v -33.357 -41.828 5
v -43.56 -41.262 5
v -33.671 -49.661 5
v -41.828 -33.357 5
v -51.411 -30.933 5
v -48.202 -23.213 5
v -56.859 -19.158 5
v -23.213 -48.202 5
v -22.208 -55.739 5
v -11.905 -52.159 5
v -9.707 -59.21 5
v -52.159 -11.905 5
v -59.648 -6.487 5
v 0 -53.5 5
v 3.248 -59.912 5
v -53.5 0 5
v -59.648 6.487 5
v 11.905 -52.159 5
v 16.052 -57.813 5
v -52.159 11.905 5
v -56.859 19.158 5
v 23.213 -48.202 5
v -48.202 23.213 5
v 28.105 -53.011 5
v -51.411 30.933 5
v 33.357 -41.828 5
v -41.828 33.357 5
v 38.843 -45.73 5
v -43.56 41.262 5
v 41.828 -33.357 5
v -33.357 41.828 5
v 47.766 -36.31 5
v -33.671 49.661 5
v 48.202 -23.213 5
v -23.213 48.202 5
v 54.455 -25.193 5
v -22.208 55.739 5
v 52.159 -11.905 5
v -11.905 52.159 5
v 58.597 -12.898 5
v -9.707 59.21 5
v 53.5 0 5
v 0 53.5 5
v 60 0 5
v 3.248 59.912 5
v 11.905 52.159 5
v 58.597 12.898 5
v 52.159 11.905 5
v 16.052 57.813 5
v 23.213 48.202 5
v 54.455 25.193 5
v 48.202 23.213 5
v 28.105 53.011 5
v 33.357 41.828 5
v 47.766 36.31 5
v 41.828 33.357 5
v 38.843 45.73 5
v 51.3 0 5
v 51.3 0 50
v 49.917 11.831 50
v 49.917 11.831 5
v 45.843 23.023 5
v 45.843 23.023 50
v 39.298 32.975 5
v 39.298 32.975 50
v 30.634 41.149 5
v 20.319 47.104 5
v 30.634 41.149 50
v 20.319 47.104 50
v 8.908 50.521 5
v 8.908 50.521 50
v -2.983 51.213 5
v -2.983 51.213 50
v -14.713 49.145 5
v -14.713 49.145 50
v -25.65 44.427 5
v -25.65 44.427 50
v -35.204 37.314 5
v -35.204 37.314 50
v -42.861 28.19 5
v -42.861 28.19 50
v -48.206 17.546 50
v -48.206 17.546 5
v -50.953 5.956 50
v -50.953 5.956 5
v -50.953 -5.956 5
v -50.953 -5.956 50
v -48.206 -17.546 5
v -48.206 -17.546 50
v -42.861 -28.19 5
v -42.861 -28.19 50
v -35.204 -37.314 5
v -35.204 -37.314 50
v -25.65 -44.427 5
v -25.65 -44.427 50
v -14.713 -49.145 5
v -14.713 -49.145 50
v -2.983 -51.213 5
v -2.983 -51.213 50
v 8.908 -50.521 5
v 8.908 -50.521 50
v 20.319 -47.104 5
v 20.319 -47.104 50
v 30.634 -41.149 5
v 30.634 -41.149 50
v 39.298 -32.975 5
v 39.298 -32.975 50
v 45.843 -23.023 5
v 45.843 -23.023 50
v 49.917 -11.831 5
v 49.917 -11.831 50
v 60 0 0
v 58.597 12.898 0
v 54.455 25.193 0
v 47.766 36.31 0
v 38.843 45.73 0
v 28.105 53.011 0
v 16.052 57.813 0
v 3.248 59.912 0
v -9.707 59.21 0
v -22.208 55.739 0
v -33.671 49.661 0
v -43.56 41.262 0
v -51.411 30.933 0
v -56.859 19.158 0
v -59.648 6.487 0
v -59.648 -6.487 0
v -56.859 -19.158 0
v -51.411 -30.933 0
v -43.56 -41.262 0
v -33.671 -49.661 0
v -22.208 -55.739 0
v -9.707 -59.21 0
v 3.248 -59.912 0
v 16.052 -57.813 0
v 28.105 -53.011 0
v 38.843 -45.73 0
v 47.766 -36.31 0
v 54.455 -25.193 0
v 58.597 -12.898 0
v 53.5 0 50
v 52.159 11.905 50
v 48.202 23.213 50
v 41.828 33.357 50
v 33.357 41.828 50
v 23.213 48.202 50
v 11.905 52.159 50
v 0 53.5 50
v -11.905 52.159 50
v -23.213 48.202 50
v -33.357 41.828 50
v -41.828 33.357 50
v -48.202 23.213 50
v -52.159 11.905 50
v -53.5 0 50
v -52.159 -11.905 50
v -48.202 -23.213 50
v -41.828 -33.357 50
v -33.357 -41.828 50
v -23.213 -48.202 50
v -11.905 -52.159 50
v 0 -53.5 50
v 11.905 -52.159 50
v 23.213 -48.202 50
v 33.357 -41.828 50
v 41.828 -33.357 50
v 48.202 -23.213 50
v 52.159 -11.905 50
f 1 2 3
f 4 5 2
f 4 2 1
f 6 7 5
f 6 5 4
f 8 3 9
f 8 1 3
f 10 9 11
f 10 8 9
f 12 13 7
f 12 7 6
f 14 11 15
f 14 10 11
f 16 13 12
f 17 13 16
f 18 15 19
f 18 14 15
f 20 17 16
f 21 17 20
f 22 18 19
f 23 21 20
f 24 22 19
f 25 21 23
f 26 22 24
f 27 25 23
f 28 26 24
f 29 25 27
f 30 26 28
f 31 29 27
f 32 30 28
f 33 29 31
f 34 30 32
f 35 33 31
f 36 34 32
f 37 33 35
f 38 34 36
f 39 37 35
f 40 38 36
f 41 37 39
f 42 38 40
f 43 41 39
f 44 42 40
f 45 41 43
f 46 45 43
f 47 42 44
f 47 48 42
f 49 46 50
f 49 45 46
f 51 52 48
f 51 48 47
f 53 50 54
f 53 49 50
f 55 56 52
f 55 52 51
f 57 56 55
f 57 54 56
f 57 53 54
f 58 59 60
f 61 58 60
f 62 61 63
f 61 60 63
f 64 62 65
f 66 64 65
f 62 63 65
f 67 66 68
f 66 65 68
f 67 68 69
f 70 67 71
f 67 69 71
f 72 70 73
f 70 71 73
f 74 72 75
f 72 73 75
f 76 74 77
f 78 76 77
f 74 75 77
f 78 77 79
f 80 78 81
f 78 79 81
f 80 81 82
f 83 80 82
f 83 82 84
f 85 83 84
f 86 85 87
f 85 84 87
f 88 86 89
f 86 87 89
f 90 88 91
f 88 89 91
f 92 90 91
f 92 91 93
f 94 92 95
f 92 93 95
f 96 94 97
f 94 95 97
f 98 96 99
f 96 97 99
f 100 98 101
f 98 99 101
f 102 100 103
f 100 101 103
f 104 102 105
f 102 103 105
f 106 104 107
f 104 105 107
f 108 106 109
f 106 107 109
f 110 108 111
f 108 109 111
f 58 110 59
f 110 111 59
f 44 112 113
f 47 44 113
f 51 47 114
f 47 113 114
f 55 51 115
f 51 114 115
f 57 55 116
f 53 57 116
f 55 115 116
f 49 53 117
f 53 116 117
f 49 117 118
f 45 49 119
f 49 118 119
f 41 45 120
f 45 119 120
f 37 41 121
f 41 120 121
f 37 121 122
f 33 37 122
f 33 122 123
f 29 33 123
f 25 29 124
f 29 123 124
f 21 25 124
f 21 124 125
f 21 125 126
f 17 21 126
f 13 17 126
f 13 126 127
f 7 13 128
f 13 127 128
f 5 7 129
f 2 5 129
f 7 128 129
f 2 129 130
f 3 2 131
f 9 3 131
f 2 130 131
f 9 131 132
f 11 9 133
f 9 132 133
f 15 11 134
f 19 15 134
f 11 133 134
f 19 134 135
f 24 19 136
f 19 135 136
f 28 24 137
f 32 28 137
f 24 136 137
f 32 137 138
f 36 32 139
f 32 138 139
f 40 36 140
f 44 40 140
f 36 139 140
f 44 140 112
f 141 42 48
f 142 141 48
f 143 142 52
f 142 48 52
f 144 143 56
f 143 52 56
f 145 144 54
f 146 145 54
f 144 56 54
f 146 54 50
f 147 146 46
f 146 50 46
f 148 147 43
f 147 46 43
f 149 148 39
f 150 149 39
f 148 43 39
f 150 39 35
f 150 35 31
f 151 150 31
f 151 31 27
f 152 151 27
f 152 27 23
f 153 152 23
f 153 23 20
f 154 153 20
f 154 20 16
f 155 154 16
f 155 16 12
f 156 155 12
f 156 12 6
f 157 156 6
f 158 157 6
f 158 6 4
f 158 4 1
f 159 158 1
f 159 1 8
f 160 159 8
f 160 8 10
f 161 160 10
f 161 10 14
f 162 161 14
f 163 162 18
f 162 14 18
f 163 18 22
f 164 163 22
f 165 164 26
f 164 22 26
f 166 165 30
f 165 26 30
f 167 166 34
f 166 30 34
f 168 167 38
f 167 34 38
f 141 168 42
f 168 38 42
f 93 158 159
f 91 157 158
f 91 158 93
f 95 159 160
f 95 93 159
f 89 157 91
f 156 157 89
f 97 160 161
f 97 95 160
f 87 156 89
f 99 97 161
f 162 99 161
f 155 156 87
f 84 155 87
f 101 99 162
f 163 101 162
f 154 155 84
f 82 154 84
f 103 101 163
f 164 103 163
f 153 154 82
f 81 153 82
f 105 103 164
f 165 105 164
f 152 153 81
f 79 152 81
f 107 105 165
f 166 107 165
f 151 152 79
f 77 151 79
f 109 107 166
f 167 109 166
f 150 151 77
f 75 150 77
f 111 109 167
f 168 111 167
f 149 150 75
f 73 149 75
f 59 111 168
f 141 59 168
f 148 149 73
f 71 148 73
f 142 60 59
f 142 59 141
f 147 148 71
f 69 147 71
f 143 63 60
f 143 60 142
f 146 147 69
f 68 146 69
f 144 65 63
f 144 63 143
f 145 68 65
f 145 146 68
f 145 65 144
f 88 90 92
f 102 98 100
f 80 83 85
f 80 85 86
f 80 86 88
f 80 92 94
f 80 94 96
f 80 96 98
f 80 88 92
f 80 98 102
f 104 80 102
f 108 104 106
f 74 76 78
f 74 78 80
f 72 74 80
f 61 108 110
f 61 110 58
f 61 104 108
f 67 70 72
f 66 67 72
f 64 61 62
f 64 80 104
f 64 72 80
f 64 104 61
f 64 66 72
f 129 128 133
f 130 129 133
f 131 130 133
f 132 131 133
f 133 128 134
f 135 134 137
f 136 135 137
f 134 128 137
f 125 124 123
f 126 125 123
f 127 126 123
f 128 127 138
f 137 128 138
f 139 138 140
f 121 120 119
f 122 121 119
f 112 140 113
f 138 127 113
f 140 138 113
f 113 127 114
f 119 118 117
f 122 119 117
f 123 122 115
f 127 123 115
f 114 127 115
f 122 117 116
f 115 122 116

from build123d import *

# Parameters (mm, degrees)
CYLINDER_R        = 60
CYLINDER_DEPTH    = 5
CYLINDER001_R     = 53.5
CYLINDER001_DEPTH = 50
SKETCH001_R       = 51.3
POCKET_DEPTH      = 45


with BuildPart() as part:
    # Cylinder → Cylinder (join)
    with BuildSketch(Plane.XY):
        Circle(CYLINDER_R)
    extrude(amount=CYLINDER_DEPTH)

    # Cylinder001 → Cylinder001 (join)
    with BuildSketch(Plane.XY):
        Circle(CYLINDER001_R)
    extrude(amount=CYLINDER001_DEPTH)

    # Sketch001 (on Face6 of Cylinder001) → Pocket (cut)
    with BuildSketch(Plane.XY.offset(50)):
        Circle(SKETCH001_R)
    extrude(amount=-POCKET_DEPTH, mode=Mode.SUBTRACT)


solid = part.part
